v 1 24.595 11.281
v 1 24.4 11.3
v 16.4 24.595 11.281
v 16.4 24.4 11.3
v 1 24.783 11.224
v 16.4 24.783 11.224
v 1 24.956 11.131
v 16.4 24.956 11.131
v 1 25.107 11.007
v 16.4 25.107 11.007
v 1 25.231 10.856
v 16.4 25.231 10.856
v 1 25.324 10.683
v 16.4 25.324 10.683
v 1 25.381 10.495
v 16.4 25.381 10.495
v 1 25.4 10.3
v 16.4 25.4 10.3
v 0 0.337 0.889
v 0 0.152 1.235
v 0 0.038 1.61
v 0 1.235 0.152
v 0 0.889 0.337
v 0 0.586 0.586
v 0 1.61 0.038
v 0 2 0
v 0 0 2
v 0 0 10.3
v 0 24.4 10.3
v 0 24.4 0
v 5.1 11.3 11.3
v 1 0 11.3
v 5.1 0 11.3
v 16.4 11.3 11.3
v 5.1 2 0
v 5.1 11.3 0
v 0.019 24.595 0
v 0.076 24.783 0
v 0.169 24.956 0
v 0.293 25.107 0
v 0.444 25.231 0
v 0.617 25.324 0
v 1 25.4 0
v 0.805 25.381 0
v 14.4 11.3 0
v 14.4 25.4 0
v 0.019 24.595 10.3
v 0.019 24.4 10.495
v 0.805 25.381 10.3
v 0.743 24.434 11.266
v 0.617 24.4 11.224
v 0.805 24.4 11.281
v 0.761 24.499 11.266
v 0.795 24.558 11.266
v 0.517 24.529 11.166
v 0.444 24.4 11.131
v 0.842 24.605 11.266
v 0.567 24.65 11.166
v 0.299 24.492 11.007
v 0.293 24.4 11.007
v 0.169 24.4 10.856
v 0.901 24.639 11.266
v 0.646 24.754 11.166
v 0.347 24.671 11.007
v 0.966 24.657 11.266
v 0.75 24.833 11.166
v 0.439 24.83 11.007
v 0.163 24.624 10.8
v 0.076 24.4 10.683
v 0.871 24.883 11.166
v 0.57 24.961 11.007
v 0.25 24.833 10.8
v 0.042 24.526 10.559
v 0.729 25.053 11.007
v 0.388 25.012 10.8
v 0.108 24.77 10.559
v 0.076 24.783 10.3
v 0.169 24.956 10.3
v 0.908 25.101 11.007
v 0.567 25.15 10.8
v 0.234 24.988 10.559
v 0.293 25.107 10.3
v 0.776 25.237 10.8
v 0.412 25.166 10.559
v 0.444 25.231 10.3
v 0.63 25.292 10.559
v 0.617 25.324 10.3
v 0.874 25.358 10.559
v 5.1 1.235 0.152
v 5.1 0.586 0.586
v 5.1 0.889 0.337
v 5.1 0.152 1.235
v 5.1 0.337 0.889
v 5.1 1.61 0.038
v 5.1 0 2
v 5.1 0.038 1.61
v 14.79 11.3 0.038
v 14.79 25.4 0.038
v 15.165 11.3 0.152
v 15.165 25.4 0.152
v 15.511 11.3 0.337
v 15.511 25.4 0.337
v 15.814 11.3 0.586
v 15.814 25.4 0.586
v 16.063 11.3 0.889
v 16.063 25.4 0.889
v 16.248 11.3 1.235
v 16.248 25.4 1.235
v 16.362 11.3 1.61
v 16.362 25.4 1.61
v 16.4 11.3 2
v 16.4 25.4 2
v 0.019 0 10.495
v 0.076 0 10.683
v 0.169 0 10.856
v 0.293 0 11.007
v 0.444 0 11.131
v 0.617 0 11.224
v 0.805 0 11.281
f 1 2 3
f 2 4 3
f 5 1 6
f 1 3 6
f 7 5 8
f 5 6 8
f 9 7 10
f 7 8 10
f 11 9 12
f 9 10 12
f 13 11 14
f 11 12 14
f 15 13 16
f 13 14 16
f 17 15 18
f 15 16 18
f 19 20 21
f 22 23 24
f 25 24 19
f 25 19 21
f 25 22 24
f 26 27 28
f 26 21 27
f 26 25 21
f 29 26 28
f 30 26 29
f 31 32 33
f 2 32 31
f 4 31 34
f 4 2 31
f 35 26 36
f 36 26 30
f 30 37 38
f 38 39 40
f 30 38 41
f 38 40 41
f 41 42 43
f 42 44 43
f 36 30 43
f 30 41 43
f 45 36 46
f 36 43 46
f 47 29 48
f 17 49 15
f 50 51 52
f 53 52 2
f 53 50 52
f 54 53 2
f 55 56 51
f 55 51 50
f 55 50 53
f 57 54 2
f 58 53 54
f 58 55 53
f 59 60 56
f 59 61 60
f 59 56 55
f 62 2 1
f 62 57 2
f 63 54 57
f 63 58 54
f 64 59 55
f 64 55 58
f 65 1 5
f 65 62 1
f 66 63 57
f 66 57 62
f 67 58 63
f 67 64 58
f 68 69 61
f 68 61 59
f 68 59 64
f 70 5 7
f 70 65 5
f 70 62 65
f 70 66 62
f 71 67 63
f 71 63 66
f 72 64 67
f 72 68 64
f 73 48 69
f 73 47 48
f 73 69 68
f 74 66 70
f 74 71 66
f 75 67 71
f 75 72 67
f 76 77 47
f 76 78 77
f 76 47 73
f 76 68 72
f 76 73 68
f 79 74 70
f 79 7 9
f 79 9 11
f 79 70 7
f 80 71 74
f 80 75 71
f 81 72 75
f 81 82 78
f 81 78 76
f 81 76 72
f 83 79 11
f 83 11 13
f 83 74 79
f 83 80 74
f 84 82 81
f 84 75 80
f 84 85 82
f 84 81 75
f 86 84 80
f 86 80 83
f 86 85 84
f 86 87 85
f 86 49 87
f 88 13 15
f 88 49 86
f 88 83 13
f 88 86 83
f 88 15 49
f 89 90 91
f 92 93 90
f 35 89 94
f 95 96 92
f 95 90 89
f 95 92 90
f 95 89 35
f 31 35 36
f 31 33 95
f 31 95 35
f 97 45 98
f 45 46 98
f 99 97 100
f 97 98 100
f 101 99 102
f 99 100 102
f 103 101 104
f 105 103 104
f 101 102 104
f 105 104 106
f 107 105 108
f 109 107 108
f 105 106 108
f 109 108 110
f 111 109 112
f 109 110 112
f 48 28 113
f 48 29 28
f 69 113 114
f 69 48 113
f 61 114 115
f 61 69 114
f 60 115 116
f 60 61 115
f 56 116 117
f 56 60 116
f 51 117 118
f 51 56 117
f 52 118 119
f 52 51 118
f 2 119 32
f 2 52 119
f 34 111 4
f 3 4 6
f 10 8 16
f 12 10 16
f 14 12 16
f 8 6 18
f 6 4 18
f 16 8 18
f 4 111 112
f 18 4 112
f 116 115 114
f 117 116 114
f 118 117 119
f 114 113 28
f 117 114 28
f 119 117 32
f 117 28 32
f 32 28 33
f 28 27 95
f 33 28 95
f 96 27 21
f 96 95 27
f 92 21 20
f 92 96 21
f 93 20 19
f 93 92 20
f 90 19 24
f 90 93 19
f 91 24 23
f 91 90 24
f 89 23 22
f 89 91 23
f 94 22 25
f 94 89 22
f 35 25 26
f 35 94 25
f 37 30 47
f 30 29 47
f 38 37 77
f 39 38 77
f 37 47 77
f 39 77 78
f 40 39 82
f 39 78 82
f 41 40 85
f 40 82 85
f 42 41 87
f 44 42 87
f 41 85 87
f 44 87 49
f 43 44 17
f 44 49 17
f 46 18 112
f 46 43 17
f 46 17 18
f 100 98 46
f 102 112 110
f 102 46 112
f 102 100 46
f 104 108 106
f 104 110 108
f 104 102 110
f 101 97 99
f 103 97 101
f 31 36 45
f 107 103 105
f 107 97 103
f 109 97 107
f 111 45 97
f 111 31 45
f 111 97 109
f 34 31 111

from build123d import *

# Parameters (mm, degrees)
F0_W     = 16.4
F0_H     = 25.4
F1_DEPTH = 11.3
F2_W     = 11.3
F2_H     = 11.3
F3_DEPTH = 25
F4_R     = 2
F5_R     = 1


with BuildPart() as f1:
    # F0 (on Top) → F1 (new body)
    with BuildSketch(Plane.XY):
        with Locations((8.2, 12.7)):
            Rectangle(F0_W, F0_H)
    extrude(amount=F1_DEPTH)

    # F2 (on face) → F3 (cut)
    with BuildSketch(Plane.XY.offset(11.3)):
        with Locations((10.75, 5.65)):
            Rectangle(F2_W, F2_H)
    extrude(amount=-F3_DEPTH, mode=Mode.SUBTRACT)

    # F4
    f4_edges = [f1.edges().sort_by_distance(p)[0] for p in [
        (16.4, 18.35, 0),
        (2.55, 0, 0),
    ]]
    fillet(f4_edges, radius=F4_R)

    # F5
    f5_edges = [f1.edges().sort_by_distance(p)[0] for p in [
        (0, 25.4, 5.65),
        (0, 12.7, 11.3),
        (8.2, 25.4, 11.3),
    ]]
    fillet(f5_edges, radius=F5_R)


solid = f1.part
